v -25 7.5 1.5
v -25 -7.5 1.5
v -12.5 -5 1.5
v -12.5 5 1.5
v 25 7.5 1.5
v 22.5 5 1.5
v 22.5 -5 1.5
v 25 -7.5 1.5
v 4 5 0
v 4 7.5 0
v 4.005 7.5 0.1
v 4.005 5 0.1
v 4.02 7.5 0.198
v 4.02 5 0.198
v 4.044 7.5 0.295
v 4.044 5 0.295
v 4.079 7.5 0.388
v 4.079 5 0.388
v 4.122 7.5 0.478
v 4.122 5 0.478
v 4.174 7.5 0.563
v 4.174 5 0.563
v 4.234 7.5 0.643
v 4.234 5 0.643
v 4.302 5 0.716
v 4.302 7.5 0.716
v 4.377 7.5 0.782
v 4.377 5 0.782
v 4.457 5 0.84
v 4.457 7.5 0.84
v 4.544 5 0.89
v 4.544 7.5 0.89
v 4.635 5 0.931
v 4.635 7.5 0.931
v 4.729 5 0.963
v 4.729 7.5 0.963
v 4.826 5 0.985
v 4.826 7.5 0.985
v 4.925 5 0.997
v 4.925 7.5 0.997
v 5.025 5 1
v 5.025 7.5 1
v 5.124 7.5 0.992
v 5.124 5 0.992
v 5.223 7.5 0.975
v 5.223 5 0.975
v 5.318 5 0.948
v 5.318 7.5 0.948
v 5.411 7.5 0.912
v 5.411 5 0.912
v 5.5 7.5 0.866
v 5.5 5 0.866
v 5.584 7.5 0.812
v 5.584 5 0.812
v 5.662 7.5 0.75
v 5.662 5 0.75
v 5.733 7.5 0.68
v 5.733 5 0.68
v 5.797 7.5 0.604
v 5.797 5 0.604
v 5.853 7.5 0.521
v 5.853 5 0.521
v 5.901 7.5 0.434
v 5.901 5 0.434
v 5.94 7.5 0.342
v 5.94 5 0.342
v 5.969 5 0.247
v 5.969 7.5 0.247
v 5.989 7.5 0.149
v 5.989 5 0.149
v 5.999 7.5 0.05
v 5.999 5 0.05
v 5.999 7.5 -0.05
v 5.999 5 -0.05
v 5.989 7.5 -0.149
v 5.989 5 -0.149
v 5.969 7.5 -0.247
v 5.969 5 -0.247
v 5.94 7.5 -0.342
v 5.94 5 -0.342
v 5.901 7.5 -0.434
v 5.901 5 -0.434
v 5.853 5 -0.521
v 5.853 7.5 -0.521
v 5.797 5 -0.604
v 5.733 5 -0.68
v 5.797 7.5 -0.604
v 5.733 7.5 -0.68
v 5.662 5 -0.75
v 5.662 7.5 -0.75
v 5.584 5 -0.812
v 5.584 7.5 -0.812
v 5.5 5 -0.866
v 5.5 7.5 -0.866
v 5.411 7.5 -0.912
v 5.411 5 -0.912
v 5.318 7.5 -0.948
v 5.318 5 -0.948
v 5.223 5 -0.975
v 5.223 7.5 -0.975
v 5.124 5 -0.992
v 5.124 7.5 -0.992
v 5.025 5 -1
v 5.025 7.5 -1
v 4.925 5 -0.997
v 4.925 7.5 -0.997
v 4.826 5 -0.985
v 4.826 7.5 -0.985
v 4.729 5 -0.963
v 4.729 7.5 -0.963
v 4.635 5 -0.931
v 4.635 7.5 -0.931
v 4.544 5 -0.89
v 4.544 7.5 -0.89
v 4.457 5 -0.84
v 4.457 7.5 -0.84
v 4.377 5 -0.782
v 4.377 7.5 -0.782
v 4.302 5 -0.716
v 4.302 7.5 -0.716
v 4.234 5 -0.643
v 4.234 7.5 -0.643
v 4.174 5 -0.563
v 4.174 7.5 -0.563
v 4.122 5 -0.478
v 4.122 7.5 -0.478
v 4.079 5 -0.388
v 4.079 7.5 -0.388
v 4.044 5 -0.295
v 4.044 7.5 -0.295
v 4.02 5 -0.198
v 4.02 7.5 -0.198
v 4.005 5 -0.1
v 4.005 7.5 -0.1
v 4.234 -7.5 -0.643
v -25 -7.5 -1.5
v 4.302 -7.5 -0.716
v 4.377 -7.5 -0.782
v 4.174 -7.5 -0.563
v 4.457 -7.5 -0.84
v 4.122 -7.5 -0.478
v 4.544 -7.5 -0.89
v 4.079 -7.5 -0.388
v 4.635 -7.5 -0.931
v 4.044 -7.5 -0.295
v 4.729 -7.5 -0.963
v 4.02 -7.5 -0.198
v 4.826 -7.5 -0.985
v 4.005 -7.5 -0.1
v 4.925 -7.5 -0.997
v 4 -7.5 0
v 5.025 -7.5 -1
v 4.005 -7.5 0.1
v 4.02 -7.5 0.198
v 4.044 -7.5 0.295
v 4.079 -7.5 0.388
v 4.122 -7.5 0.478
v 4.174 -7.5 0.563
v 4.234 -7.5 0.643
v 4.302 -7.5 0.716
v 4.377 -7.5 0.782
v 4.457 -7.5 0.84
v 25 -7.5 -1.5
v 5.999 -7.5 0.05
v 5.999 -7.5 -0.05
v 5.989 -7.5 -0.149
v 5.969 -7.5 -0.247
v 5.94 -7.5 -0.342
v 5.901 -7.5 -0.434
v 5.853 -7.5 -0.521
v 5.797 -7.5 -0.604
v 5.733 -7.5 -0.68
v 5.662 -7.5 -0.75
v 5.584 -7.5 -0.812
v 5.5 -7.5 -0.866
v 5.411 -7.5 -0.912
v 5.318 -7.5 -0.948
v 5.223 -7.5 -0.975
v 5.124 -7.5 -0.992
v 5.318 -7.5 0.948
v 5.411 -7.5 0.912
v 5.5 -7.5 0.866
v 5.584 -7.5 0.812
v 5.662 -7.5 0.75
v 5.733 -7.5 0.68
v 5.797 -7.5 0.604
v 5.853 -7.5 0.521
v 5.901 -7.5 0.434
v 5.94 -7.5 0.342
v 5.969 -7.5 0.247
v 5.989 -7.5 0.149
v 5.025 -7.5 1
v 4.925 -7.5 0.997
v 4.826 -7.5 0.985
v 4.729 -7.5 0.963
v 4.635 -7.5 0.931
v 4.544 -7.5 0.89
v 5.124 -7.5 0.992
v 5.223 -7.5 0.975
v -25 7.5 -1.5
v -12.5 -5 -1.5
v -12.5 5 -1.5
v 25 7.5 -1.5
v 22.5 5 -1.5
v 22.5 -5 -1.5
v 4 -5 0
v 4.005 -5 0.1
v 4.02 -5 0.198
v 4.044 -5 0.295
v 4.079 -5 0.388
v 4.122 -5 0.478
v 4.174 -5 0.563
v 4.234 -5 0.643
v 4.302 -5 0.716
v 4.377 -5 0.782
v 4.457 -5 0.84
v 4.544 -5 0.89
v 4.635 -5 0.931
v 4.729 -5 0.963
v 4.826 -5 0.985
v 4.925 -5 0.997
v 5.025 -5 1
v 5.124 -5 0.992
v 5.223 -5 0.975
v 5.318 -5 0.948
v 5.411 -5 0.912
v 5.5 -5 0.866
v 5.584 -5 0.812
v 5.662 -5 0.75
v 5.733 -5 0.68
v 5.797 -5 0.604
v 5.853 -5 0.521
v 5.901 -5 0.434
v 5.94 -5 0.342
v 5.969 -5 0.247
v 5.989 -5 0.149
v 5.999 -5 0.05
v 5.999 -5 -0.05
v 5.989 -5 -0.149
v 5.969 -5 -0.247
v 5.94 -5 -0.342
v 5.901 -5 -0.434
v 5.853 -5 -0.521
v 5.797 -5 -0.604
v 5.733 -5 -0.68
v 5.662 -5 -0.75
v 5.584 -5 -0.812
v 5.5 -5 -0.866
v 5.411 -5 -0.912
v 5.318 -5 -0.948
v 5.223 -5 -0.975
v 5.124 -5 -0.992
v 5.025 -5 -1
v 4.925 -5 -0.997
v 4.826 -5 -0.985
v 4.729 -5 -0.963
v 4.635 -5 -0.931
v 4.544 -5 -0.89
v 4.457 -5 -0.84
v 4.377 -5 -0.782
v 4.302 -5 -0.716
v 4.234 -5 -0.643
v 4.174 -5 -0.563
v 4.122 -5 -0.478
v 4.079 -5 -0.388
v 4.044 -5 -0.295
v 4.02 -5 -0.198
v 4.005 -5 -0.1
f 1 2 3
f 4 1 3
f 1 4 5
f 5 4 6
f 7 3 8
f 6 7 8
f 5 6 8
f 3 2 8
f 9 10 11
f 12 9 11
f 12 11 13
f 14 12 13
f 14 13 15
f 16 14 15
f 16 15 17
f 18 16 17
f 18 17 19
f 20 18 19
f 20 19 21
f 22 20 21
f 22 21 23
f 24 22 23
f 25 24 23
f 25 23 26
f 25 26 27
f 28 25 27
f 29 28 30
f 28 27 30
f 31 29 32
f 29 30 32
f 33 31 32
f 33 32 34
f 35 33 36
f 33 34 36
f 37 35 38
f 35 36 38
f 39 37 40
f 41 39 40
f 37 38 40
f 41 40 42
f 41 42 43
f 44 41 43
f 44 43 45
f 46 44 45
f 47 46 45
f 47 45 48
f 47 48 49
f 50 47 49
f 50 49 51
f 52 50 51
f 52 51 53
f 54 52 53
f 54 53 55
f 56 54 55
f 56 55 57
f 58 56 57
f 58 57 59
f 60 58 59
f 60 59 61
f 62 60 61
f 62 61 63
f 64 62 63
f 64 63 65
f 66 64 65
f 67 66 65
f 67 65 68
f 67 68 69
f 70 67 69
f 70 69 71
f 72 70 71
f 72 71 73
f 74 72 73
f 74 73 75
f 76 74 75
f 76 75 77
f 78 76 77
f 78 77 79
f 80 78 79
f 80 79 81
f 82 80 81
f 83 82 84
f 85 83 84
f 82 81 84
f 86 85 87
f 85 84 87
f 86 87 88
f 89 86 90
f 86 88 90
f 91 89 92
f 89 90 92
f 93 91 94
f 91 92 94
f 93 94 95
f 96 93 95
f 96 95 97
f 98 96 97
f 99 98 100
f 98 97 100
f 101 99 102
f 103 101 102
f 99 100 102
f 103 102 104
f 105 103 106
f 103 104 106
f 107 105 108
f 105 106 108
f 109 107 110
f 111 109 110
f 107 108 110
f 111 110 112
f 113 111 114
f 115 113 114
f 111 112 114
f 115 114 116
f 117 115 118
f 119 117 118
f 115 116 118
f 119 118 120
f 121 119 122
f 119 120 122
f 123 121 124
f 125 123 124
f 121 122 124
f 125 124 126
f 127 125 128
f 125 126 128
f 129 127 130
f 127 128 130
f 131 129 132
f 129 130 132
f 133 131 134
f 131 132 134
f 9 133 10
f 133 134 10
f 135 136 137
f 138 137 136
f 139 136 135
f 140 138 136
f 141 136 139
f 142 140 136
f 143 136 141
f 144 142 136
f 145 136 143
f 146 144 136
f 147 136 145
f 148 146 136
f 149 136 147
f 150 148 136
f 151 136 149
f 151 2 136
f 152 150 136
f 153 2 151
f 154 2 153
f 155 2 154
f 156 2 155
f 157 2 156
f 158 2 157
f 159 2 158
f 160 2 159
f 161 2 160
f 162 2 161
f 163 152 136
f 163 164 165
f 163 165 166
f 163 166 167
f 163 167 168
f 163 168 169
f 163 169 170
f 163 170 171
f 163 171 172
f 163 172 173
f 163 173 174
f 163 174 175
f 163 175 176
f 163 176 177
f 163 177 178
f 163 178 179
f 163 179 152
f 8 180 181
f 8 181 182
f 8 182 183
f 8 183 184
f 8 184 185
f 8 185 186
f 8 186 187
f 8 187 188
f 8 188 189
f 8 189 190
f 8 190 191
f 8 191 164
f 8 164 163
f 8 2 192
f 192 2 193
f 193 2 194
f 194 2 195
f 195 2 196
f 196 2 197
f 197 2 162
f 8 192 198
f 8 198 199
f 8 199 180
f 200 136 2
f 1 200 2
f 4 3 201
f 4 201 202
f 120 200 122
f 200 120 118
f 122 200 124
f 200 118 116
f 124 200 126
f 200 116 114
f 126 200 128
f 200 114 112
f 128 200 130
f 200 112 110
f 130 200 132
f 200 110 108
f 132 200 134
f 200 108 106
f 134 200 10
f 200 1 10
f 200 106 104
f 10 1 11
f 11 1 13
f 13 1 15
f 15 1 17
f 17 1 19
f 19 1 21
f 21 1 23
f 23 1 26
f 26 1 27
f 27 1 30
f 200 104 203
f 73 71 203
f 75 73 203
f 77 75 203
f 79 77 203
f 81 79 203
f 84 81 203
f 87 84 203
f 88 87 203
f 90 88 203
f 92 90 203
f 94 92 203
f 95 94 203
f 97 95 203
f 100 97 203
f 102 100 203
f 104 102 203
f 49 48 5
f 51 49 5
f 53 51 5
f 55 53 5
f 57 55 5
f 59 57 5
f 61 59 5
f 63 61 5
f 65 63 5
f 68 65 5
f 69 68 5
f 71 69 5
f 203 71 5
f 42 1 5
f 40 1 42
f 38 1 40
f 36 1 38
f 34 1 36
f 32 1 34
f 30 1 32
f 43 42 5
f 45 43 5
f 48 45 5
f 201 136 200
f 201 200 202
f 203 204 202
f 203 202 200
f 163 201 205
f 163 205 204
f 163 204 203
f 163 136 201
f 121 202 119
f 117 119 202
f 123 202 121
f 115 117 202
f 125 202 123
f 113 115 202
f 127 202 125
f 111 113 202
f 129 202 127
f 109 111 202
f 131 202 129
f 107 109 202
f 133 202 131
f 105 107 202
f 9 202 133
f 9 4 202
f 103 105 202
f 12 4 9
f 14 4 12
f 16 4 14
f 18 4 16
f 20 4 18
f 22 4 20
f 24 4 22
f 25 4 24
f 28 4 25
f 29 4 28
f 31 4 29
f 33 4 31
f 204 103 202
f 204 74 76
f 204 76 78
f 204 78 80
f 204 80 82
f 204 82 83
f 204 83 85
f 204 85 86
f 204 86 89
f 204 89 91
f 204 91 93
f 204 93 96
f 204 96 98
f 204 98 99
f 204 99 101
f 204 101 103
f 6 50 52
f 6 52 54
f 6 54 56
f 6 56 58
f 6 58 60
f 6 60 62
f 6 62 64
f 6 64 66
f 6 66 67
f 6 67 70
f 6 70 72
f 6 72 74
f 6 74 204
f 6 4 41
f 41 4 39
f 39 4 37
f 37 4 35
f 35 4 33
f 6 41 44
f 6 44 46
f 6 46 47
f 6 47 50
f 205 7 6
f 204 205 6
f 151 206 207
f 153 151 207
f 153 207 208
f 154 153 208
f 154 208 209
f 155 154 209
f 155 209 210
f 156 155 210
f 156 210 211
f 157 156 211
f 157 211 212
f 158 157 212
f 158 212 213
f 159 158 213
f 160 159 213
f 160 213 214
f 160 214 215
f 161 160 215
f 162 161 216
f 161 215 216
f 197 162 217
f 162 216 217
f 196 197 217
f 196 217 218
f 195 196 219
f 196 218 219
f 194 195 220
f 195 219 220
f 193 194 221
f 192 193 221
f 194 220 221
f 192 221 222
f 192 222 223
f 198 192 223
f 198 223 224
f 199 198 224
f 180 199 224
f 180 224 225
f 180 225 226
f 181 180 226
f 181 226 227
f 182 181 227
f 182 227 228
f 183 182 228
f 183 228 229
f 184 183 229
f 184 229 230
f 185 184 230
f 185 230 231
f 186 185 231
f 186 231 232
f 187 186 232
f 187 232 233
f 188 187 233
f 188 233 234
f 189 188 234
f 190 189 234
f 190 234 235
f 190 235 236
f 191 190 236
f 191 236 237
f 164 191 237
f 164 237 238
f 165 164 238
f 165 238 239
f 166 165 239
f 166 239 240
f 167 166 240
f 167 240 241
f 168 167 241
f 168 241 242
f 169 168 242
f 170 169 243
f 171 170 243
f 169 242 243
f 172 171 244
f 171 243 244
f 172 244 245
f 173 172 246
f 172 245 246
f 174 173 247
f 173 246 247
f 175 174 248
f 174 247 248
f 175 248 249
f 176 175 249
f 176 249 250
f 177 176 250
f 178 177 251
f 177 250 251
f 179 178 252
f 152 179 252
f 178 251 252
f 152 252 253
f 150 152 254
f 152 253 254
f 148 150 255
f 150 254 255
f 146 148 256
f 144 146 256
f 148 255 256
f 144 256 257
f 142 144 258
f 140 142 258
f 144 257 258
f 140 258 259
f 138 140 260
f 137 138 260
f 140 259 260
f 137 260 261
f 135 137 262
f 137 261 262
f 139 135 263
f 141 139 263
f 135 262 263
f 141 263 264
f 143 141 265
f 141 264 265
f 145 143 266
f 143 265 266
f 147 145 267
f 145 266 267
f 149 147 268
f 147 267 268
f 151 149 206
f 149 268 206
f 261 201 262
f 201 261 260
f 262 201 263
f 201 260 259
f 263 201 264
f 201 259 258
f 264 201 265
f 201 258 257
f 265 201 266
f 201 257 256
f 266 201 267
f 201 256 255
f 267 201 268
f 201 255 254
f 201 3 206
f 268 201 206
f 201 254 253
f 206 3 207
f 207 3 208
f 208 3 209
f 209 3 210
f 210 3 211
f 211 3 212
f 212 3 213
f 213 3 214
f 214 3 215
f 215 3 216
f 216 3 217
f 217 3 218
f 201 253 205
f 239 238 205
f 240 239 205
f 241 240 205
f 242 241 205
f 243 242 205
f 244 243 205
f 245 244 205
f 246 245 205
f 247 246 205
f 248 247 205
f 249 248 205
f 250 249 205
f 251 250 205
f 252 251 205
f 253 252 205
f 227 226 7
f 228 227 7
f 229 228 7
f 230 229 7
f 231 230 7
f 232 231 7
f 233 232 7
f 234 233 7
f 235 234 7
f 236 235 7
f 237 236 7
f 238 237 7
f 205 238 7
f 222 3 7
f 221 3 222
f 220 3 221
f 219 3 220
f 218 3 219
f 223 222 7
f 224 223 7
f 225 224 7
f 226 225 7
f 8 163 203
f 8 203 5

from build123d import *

# Parameters (mm, degrees)
F0_W     = 50
F0_H     = 3
F1_DEPTH = 7.5
F2_W     = 35
F2_H     = 10
F3_DEPTH = 1.5
F5_D     = 2


with BuildPart() as f1:
    # F0 (on Front) → F1 (new body, symmetric)
    with BuildSketch(Plane.XZ):
        Rectangle(F0_W, F0_H)
    extrude(amount=F1_DEPTH, both=True)

    # F2 (on Top) → F3 (cut, symmetric)
    with BuildSketch(Plane.XY):
        with Locations((5, 0)):
            Rectangle(F2_W, F2_H)
    extrude(amount=F3_DEPTH, both=True, mode=Mode.SUBTRACT)

    # F5 (through all)
    with Locations(Plane.XZ.offset(7.5)):
        with Locations((5, 0)):
            Hole(F5_D / 2)


solid = f1.part
